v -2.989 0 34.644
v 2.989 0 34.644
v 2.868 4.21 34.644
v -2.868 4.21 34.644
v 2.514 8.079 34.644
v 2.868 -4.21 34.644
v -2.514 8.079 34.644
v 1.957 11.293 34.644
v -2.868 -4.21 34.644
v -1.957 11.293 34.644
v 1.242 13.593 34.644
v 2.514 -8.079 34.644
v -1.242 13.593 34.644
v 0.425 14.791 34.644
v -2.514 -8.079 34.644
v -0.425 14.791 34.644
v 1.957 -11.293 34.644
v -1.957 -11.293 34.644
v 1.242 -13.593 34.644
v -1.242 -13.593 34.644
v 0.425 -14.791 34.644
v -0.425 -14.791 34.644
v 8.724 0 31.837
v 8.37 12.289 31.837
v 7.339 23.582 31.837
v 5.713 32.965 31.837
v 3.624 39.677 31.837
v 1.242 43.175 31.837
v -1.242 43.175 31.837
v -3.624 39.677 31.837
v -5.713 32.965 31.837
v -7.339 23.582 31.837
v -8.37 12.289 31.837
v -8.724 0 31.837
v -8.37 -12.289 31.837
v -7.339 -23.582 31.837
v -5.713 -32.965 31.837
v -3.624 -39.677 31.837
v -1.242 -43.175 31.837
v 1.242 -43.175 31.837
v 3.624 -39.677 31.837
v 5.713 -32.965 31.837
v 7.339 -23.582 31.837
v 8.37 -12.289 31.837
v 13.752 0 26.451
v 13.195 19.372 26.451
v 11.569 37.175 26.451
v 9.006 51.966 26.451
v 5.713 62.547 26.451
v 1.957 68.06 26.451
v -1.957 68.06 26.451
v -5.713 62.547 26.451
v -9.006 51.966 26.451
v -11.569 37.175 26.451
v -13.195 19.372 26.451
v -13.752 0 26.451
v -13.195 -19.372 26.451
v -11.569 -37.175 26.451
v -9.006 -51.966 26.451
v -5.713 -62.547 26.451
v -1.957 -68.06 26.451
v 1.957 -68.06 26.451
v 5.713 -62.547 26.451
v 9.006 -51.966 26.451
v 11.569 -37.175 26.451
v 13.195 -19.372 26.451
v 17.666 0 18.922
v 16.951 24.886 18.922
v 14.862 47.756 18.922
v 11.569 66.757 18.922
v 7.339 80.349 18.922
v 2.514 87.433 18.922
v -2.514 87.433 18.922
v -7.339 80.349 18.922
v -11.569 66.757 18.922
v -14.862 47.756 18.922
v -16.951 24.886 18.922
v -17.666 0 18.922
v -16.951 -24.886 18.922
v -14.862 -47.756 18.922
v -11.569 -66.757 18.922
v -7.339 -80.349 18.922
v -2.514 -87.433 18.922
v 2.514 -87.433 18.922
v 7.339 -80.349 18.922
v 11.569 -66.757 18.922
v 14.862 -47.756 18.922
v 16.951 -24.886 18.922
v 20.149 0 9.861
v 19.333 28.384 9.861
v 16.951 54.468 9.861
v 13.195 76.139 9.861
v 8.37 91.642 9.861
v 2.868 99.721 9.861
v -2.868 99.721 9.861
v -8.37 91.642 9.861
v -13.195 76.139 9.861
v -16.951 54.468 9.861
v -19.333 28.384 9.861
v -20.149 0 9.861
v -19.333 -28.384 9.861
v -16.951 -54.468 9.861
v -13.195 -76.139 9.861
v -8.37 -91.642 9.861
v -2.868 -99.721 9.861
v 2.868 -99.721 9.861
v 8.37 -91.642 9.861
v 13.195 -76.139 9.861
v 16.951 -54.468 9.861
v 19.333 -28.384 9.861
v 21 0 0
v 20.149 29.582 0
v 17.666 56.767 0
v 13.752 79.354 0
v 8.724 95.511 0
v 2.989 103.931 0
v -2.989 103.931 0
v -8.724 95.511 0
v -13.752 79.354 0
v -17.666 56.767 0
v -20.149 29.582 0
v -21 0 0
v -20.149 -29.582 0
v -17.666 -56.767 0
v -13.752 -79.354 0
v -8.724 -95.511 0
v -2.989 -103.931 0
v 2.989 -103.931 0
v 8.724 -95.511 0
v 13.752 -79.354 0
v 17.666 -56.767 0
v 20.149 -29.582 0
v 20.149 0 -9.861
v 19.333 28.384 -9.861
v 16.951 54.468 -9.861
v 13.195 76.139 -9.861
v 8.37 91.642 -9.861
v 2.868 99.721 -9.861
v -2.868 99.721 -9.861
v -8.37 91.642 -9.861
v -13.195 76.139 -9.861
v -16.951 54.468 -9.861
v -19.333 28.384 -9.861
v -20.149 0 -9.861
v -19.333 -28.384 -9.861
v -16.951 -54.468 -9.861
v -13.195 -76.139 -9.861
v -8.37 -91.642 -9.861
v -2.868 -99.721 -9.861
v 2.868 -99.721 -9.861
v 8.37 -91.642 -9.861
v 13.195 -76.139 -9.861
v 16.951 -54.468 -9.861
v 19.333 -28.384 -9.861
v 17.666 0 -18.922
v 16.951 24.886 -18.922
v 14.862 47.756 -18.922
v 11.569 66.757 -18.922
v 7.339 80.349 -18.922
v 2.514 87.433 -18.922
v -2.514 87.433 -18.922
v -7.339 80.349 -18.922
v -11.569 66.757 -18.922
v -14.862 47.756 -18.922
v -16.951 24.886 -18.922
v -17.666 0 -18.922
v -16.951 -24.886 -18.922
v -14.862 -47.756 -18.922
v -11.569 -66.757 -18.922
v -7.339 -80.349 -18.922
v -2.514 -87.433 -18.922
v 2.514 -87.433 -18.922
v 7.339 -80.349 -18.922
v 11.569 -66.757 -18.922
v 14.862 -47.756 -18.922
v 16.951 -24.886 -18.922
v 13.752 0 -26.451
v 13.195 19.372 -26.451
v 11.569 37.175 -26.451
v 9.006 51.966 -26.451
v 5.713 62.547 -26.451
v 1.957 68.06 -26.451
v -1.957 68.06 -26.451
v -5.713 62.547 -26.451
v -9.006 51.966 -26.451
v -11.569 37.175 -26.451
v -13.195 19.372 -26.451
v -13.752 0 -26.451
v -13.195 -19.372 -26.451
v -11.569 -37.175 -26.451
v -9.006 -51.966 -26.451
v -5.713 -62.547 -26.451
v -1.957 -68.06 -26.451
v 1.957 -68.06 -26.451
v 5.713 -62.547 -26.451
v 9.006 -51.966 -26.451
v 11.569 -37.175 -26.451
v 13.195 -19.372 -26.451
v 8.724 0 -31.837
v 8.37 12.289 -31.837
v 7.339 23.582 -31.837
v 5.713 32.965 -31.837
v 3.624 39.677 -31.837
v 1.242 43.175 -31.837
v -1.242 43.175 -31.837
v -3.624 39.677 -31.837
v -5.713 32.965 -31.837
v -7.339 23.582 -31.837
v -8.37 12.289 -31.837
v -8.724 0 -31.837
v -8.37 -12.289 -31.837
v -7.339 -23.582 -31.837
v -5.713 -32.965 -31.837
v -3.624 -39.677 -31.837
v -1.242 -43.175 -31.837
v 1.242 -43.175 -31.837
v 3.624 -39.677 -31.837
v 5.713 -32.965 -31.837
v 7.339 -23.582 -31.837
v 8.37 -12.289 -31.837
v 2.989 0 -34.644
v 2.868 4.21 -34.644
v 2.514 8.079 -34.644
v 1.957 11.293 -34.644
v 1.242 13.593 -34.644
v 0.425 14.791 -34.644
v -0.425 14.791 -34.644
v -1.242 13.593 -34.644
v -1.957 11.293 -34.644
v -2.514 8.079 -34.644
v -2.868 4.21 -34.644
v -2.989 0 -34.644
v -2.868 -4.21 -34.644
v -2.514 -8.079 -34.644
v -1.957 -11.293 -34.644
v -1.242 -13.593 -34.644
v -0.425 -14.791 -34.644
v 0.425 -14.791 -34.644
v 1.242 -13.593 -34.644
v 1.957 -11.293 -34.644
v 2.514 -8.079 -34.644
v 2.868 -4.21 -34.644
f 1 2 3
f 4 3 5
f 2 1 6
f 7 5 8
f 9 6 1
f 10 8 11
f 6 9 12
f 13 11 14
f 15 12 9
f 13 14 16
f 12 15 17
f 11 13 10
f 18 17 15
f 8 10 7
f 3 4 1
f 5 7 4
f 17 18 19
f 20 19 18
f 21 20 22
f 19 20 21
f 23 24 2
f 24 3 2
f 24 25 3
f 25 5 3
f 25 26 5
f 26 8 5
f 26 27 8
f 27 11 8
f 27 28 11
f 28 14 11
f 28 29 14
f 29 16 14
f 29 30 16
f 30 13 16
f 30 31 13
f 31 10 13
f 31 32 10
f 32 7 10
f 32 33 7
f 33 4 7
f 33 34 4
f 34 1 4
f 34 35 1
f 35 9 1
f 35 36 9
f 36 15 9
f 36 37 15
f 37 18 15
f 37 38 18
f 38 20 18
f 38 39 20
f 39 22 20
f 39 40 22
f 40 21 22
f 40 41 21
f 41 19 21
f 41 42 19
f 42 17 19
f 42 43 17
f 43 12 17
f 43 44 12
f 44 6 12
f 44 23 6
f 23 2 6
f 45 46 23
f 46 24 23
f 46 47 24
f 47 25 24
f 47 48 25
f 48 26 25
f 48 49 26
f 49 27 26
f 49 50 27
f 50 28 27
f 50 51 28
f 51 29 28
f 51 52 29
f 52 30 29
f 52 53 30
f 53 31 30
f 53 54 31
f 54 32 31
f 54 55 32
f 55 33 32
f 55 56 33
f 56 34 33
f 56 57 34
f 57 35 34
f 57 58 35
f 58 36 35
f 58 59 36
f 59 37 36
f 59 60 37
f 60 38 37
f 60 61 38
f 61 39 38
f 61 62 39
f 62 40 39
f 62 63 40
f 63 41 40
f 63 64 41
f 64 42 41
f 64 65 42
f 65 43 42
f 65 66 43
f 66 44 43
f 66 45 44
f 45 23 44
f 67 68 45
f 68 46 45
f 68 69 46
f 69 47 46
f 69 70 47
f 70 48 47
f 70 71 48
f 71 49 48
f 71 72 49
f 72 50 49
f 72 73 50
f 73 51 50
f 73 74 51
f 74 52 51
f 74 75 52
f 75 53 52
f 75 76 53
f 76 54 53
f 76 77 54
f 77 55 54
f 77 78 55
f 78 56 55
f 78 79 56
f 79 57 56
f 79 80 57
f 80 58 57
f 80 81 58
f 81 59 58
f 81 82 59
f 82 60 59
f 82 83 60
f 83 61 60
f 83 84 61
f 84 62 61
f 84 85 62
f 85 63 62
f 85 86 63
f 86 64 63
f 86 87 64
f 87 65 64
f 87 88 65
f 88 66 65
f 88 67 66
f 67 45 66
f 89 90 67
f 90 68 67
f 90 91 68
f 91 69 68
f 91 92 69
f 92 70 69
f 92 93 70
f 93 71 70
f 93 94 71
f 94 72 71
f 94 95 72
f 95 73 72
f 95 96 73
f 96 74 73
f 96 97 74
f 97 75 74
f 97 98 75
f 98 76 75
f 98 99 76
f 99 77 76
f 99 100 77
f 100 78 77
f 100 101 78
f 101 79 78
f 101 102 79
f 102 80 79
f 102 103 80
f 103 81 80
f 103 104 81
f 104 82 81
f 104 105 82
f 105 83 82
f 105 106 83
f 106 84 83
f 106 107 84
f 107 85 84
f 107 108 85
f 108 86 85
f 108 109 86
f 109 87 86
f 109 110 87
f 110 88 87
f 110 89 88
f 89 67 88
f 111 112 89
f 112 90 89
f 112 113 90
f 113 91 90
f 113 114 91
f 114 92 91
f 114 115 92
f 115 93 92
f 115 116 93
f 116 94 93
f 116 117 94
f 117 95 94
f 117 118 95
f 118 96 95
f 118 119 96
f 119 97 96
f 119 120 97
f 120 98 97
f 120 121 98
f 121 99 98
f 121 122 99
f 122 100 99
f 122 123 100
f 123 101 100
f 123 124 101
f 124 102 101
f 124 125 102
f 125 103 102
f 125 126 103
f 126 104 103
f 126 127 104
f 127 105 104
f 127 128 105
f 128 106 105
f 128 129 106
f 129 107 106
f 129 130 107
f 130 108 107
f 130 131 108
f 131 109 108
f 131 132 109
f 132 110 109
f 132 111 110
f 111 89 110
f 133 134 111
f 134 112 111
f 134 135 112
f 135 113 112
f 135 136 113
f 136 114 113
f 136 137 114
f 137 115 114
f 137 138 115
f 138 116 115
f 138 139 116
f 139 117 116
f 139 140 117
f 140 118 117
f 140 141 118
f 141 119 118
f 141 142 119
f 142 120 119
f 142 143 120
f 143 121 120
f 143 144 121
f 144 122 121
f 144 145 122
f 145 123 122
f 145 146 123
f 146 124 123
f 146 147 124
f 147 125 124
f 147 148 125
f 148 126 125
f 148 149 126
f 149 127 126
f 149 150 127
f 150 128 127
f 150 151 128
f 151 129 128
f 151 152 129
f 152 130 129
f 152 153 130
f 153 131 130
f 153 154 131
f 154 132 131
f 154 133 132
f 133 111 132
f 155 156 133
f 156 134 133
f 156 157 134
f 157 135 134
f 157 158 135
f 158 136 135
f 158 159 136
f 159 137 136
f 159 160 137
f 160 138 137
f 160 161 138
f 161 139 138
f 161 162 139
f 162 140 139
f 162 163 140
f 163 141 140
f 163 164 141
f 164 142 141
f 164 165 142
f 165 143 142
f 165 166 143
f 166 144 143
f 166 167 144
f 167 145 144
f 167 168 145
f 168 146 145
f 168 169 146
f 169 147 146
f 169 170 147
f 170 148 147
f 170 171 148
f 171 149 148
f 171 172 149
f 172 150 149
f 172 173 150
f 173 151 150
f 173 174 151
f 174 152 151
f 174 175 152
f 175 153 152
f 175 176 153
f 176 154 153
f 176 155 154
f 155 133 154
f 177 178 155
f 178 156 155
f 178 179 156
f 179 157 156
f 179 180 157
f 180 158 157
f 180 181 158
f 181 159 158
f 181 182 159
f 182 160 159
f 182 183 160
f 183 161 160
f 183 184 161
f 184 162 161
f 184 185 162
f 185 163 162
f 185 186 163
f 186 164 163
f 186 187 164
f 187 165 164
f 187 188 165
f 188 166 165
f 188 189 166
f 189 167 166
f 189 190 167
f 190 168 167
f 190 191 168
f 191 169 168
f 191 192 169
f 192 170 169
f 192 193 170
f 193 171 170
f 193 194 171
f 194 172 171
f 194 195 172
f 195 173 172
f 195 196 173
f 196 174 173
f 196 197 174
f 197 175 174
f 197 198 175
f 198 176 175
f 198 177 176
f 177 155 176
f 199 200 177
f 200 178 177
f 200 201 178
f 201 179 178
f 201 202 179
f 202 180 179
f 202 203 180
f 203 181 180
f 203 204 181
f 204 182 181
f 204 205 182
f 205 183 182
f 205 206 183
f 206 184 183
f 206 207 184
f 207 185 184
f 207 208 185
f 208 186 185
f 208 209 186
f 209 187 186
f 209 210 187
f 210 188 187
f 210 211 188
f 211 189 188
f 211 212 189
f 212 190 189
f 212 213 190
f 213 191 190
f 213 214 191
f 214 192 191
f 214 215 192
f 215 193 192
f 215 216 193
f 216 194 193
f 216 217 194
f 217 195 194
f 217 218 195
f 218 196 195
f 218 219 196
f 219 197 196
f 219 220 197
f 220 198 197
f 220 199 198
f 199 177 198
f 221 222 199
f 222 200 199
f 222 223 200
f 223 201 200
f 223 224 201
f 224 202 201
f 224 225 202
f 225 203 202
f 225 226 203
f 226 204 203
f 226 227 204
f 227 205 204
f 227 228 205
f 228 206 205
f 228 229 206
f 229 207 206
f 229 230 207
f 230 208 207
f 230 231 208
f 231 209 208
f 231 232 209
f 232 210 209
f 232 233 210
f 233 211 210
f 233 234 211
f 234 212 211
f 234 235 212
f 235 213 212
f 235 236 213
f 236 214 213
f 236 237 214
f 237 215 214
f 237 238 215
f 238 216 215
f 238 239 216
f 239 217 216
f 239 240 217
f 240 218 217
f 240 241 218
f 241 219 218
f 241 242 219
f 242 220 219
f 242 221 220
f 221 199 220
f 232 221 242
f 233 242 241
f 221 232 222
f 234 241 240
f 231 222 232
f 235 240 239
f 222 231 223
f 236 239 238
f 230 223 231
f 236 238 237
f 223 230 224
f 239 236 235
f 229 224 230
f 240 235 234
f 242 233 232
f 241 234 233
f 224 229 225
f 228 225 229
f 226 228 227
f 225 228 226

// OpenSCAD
// Generated by SolidPython 1.0.1 on 2020-07-29 00:46:45


scale(v = [3, 15, 5]) {
	sphere(r = 7);
}
/***********************************************
*********      SolidPython code:      **********
************************************************
 
# import packages: SolidPython
from solid import *
from solid.utils import *
from itertools import chain, combinations, permutations


class Resize:

    def __init__(self, scad_file):
        self.scad_file = scad_file
        #self.scad_file = import_scad(scad_file)
        # cone/cylinder param:
        self.r1 = 0
        self.r2 = 0
        self.h = 0
        # rectangular prism param:
        self.w = 0
        self.l = 0
        # ellipse param:
        self.r = 0

    # import OpenScad code (file name corresponds to shape)


    # classify shape + parameters
    def assign(self, param1, param2, param3):
        if self.scad_file == 'cone.scad':
            self.r1 = param1
            self.r2 = param2
            self.h = param3
        elif self.scad_file == 'cylinder.scad':
            self.r1 = param1
            self.r2 = param2
            self.h = param3
        elif self.scad_file == 'rectangularPrism.scad':
            self.h = param1
            self.l = param2
            self.w = param3
        else:
            self.r = param1
            self.h = param2

    # resize parameters
    def iterate(self):
        x = range(3, 20, 2)
        i = 1
        if self.scad_file == 'cone.scad':
            tempList = list(permutations(x, 2))
            for temp in tempList:
                param1 = temp[0]
                param2 = temp[1]
                filepath = 'produced_scad_files/' + 'cone' + str(param1) + '_' + str(param2) + '_' + '.scad'
                scad_render_to_file(cylinder(h=param1, r1=param2, r2=0), filepath)

        elif self.scad_file == 'cylinder.scad':
            tempList = list(permutations(x, 3))
            for temp in tempList:
                param1 = temp[0]
                param2 = temp[1]
                filepath = 'produced_scad_files/' + 'cylinder' + str(param1) + '_' + str(param2) + '_' + '.scad'
                scad_render_to_file(cylinder(h=param1, r1=param2, r2=param2), filepath)

        elif self.scad_file == 'rectangularPrism.scad':
            tempList = list(permutations(x, 3))
            for temp in tempList:
                param1 = temp[0]
                param2 = temp[1]
                param3 = temp[2]
                filepath = 'produced_scad_files/' + 'rectangularPrism' + str(param1) + '_' + str(param2) + '_' + str(
                    param3) + '.scad'
                scad_render_to_file(cube(size=(param1, param2, param3)), filepath)

        elif self.scad_file == 'ellipse.scad':
            tempList = list(permutations(x, 4))
            for temp in tempList:
                param1 = temp[0]
                param2 = temp[1]
                param3 = temp[2]
                param4 = temp[3]
                filepath = 'produced_scad_files/' + 'ellipse' + str(param1) + '_' + str(param2) + '_' + str(param3) + '_' + str(param4) + '.scad'
                scad_render_to_file(scale([param1, param2, param3])(sphere(r=param4)), filepath)

    def render_to_scadfile(self):
        scad_render_to_file(scad, 'example.scad') 
 
************************************************/
